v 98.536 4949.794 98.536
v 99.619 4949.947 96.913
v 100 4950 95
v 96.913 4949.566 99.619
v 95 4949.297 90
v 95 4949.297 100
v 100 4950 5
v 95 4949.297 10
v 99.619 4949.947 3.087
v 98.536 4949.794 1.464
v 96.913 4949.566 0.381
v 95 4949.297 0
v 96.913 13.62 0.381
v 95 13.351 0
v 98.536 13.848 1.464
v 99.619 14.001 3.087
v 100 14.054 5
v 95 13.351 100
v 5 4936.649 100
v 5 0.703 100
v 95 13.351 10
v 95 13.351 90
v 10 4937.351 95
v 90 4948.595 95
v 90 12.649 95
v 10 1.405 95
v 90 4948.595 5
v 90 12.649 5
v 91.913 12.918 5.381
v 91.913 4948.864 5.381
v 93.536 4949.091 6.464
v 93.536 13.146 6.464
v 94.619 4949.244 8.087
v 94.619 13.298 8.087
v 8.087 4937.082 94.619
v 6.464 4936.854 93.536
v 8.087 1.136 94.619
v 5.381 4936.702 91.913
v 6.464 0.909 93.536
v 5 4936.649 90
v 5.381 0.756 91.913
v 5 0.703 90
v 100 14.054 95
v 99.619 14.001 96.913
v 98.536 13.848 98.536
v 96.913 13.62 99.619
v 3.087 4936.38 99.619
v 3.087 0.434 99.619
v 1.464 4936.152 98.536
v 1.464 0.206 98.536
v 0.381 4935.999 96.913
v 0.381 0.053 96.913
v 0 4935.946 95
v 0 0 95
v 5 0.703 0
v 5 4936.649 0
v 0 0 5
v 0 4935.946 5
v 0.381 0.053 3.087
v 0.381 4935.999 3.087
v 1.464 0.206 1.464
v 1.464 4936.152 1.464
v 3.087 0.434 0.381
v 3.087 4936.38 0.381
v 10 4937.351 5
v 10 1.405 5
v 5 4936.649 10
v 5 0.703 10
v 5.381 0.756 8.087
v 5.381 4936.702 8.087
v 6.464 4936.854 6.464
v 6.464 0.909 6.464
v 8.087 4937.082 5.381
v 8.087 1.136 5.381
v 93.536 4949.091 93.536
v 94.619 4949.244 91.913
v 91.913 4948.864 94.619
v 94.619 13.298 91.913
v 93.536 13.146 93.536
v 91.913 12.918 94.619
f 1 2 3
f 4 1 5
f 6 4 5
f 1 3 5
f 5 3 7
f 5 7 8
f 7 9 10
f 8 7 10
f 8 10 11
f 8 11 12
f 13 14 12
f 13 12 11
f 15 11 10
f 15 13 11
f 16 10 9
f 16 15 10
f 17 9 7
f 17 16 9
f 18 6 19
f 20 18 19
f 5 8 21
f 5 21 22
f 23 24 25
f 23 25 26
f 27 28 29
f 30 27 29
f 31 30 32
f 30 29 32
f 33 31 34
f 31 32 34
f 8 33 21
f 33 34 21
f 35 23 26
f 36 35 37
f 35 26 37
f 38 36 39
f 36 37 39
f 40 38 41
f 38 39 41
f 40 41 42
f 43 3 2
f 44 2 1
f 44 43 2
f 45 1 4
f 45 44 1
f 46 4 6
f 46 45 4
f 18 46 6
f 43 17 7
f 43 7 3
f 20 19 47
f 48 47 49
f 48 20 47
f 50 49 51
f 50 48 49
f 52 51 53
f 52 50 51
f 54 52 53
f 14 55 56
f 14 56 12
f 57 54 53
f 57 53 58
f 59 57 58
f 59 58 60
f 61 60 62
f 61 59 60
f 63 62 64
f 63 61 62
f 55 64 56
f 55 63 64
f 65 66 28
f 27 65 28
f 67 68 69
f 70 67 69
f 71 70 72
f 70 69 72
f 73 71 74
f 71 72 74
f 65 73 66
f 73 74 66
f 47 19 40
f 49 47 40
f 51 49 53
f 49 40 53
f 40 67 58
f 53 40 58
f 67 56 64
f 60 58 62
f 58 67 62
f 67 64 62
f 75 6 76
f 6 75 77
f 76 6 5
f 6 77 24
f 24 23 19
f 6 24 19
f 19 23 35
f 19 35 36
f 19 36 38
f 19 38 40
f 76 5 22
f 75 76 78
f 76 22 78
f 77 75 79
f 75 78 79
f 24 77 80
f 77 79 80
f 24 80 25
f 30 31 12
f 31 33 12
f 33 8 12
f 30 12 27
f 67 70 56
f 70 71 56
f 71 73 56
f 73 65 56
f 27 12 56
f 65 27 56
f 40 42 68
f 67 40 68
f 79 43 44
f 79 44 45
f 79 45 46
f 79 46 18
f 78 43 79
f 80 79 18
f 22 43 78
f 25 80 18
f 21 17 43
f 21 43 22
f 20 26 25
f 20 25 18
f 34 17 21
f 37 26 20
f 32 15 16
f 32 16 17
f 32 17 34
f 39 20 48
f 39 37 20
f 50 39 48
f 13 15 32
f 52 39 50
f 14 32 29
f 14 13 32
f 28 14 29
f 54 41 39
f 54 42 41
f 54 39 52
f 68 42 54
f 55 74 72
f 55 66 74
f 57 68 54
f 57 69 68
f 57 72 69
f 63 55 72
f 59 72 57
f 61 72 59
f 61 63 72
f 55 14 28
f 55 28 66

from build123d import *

# Parameters (mm, degrees)
BOSS_EXTRUDE1_DEPTH = 4950
CUT_EXTRUDE1_DEPTH  = 1000


with BuildPart() as part:
    # Sketch1 → Boss-Extrude1 (new body)
    with BuildSketch(Plane(origin=(0, 0, 0), x_dir=(1, 0, 0), z_dir=(0, 1, 0))):
        with BuildLine():
            Line((5, 0), (95, 0))
            ThreePointArc((95, 0), (98.535533906, -1.464466094), (100, -5))
            Line((100, -5), (100, -95))
            ThreePointArc((100, -95), (98.535533906, -98.535533906), (95, -100))
            Line((95, -100), (5, -100))
            ThreePointArc((5, -100), (1.464466094, -98.535533906), (0, -95))
            Line((0, -95), (0, -5))
            ThreePointArc((0, -5), (1.464466094, -1.464466094), (5, 0))
        make_face()
        with BuildLine():
            Line((10, -5), (90, -5))
            ThreePointArc((90, -5), (93.535533906, -6.464466094), (95, -10))
            Line((95, -10), (95, -90))
            ThreePointArc((95, -90), (93.535533906, -93.535533906), (90, -95))
            Line((90, -95), (10, -95))
            ThreePointArc((10, -95), (6.464466094, -93.535533906), (5, -90))
            Line((5, -90), (5, -10))
            ThreePointArc((5, -10), (6.464466094, -6.464466094), (10, -5))
        make_face(mode=Mode.SUBTRACT)
    extrude(amount=BOSS_EXTRUDE1_DEPTH)

    # Sketch2 → Cut-Extrude1 (cut)
    with BuildSketch(Plane(origin=(0, 0, 0), x_dir=(-1, 0, 0), z_dir=(0, 0, -1))):
        Polygon((-95, 4950), (-95, 4949.297295826), (-5, 4936.648620703), (-5, 4950), align=None)
        Polygon((-5, 4936.648620703), (0, 4935.94591653), (0, 4950), (-5, 4950), align=None)
        Polygon((-100, 4950), (-95, 4949.297295826), (-95, 4950), align=None)
        Polygon((-100, 0), (-100, 14.05408347), (0, 0), align=None)
    extrude(amount=-CUT_EXTRUDE1_DEPTH, mode=Mode.SUBTRACT)


solid = part.part
